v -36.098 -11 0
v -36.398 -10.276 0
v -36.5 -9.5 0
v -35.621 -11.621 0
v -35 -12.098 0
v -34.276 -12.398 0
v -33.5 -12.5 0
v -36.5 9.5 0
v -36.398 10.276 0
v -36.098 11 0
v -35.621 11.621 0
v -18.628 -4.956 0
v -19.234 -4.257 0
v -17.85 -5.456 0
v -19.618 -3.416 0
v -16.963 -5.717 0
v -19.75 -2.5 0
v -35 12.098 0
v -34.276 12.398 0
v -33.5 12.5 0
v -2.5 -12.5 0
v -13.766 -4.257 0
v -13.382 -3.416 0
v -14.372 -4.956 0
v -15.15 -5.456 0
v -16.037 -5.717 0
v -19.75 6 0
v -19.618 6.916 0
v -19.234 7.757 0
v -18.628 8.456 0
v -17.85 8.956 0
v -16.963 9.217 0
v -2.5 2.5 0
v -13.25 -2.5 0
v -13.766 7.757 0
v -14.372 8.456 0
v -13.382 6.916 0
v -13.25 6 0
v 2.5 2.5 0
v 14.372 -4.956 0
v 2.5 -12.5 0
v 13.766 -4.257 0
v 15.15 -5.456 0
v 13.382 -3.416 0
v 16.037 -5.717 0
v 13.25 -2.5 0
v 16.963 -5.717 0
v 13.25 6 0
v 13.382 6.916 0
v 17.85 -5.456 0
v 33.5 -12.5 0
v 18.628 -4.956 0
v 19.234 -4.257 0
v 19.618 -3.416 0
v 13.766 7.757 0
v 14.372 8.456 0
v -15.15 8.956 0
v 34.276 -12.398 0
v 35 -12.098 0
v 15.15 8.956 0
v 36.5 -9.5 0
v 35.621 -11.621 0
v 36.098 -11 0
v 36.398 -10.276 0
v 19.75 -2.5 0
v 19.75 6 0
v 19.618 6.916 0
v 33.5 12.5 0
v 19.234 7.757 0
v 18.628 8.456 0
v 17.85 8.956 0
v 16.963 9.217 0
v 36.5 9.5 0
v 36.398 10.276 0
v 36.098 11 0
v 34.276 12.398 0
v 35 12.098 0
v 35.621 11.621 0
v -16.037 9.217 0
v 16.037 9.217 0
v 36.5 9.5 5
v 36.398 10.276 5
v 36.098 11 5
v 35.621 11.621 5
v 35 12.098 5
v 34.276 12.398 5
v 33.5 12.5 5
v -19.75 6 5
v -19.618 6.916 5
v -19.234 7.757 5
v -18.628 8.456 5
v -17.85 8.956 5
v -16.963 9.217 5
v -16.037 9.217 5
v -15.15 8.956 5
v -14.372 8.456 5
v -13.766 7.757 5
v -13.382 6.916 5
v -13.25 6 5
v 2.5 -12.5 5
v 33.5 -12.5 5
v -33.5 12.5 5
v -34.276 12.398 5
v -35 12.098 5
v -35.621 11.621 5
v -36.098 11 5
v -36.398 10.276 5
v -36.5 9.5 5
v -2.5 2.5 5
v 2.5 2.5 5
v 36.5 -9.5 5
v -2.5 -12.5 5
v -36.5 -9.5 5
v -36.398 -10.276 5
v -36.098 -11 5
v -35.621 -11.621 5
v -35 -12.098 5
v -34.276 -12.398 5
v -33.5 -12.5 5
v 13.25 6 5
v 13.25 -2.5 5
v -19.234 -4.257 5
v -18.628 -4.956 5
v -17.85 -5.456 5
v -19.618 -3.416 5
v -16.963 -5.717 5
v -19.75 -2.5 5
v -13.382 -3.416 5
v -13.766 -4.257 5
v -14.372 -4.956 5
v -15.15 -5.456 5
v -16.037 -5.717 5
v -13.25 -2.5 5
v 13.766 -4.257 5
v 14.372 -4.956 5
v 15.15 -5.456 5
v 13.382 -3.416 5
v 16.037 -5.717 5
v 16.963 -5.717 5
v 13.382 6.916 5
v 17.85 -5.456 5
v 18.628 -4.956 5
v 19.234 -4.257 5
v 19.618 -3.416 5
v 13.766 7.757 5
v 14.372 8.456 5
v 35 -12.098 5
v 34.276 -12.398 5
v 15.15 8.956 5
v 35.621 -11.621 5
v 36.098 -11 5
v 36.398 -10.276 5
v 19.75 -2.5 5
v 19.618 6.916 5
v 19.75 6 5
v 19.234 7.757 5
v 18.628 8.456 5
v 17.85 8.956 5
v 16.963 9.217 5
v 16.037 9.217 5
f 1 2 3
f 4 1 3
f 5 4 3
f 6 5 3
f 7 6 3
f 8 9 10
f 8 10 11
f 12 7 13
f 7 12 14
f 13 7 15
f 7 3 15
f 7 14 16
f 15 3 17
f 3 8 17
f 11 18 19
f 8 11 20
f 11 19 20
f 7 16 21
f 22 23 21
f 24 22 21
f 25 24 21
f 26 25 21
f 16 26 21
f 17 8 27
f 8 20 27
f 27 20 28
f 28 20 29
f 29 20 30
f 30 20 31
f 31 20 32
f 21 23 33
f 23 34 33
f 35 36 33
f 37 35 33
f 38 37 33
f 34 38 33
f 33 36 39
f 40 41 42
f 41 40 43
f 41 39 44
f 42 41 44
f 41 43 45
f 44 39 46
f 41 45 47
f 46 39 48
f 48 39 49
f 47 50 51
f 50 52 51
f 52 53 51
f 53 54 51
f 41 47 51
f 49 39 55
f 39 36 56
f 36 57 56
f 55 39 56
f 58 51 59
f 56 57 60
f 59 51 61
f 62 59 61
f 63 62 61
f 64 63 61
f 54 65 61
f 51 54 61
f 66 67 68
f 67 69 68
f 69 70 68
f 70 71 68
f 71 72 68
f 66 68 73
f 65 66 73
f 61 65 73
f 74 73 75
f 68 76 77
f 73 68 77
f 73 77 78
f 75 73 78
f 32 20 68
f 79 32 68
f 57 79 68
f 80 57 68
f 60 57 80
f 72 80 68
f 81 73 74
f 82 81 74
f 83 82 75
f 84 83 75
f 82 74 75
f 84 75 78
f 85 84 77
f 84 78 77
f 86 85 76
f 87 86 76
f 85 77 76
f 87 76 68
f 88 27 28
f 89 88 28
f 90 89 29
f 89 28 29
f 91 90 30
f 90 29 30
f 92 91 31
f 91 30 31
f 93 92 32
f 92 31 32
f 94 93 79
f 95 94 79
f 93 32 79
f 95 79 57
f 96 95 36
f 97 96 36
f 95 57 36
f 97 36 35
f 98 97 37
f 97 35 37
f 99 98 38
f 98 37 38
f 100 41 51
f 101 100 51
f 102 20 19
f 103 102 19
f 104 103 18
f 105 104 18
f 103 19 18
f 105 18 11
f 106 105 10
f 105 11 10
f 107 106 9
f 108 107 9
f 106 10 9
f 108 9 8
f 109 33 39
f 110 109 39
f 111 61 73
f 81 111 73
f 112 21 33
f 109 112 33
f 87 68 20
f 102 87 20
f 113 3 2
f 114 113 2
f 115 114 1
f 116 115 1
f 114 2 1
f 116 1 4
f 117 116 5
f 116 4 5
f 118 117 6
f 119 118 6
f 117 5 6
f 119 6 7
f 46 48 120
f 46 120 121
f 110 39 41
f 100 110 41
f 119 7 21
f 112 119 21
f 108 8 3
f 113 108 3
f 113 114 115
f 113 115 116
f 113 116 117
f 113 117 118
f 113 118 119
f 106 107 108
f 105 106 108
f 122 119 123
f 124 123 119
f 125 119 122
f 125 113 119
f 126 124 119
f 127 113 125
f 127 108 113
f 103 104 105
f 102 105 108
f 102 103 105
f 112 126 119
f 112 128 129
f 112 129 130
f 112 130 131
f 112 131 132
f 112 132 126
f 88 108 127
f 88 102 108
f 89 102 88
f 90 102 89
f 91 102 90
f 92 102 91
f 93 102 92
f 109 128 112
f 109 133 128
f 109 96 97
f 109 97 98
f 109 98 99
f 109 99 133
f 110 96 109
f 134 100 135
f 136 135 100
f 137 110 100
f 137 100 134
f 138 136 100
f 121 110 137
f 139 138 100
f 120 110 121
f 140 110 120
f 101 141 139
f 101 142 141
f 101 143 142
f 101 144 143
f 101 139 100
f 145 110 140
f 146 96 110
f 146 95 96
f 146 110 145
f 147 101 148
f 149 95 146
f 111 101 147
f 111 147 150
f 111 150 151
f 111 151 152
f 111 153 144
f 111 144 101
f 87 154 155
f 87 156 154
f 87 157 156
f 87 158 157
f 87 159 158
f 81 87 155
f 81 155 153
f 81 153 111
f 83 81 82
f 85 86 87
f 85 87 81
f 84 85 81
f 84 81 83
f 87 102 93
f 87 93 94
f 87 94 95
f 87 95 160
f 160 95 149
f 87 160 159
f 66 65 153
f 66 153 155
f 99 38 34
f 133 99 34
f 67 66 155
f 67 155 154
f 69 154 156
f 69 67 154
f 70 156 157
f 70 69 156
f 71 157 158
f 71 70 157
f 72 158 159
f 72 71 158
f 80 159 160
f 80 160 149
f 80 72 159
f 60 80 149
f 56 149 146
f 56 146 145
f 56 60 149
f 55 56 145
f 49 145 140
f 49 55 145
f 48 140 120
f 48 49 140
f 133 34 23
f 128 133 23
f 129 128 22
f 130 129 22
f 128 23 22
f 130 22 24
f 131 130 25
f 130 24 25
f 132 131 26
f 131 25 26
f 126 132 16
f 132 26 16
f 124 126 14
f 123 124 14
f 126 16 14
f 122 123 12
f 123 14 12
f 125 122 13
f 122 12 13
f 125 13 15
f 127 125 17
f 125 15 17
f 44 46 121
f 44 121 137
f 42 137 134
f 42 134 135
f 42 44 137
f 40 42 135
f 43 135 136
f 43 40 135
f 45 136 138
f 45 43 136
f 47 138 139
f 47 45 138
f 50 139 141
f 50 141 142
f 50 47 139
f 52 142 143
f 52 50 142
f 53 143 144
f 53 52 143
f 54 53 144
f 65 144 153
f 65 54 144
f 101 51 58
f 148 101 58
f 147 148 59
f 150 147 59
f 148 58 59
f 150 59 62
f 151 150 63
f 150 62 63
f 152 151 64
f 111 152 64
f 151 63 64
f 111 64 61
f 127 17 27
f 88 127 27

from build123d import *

# Parameters (mm, degrees)
EXTRUDE_1_DEPTH = 5


with BuildPart() as part:
    # 草图1 → 凸台-拉伸1 (new body)
    with BuildSketch(Plane.XY):
        with BuildLine():
            Line((36.5, -9.5), (36.5, 9.5))
            ThreePointArc((36.5, 9.5), (35.621320344, 11.621320344), (33.5, 12.5))
            Line((33.5, 12.5), (-33.5, 12.5))
            ThreePointArc((-33.5, 12.5), (-35.621320344, 11.621320344), (-36.5, 9.5))
            Line((-36.5, 9.5), (-36.5, -9.5))
            ThreePointArc((-36.5, -9.5), (-35.621320344, -11.621320344), (-33.5, -12.5))
            Line((-33.5, -12.5), (-2.5, -12.5))
            Line((-2.5, -12.5), (-2.5, 2.5))
            Line((-2.5, 2.5), (2.5, 2.5))
            Line((2.5, 2.5), (2.5, -12.5))
            Line((2.5, -12.5), (33.5, -12.5))
            ThreePointArc((33.5, -12.5), (35.621320344, -11.621320344), (36.5, -9.5))
        make_face()
        with BuildLine():
            Line((-19.75, -2.5), (-19.75, 6))
            ThreePointArc((-19.75, 6), (-16.5, 9.25), (-13.25, 6))
            Line((-13.25, 6), (-13.25, -2.5))
            ThreePointArc((-13.25, -2.5), (-16.5, -5.75), (-19.75, -2.5))
        make_face(mode=Mode.SUBTRACT)
        with BuildLine():
            Line((19.75, -2.5), (19.75, 6))
            ThreePointArc((19.75, 6), (16.5, 9.25), (13.25, 6))
            Line((13.25, 6), (13.25, -2.5))
            ThreePointArc((13.25, -2.5), (16.5, -5.75), (19.75, -2.5))
        make_face(mode=Mode.SUBTRACT)
    extrude(amount=EXTRUDE_1_DEPTH)


solid = part.part
